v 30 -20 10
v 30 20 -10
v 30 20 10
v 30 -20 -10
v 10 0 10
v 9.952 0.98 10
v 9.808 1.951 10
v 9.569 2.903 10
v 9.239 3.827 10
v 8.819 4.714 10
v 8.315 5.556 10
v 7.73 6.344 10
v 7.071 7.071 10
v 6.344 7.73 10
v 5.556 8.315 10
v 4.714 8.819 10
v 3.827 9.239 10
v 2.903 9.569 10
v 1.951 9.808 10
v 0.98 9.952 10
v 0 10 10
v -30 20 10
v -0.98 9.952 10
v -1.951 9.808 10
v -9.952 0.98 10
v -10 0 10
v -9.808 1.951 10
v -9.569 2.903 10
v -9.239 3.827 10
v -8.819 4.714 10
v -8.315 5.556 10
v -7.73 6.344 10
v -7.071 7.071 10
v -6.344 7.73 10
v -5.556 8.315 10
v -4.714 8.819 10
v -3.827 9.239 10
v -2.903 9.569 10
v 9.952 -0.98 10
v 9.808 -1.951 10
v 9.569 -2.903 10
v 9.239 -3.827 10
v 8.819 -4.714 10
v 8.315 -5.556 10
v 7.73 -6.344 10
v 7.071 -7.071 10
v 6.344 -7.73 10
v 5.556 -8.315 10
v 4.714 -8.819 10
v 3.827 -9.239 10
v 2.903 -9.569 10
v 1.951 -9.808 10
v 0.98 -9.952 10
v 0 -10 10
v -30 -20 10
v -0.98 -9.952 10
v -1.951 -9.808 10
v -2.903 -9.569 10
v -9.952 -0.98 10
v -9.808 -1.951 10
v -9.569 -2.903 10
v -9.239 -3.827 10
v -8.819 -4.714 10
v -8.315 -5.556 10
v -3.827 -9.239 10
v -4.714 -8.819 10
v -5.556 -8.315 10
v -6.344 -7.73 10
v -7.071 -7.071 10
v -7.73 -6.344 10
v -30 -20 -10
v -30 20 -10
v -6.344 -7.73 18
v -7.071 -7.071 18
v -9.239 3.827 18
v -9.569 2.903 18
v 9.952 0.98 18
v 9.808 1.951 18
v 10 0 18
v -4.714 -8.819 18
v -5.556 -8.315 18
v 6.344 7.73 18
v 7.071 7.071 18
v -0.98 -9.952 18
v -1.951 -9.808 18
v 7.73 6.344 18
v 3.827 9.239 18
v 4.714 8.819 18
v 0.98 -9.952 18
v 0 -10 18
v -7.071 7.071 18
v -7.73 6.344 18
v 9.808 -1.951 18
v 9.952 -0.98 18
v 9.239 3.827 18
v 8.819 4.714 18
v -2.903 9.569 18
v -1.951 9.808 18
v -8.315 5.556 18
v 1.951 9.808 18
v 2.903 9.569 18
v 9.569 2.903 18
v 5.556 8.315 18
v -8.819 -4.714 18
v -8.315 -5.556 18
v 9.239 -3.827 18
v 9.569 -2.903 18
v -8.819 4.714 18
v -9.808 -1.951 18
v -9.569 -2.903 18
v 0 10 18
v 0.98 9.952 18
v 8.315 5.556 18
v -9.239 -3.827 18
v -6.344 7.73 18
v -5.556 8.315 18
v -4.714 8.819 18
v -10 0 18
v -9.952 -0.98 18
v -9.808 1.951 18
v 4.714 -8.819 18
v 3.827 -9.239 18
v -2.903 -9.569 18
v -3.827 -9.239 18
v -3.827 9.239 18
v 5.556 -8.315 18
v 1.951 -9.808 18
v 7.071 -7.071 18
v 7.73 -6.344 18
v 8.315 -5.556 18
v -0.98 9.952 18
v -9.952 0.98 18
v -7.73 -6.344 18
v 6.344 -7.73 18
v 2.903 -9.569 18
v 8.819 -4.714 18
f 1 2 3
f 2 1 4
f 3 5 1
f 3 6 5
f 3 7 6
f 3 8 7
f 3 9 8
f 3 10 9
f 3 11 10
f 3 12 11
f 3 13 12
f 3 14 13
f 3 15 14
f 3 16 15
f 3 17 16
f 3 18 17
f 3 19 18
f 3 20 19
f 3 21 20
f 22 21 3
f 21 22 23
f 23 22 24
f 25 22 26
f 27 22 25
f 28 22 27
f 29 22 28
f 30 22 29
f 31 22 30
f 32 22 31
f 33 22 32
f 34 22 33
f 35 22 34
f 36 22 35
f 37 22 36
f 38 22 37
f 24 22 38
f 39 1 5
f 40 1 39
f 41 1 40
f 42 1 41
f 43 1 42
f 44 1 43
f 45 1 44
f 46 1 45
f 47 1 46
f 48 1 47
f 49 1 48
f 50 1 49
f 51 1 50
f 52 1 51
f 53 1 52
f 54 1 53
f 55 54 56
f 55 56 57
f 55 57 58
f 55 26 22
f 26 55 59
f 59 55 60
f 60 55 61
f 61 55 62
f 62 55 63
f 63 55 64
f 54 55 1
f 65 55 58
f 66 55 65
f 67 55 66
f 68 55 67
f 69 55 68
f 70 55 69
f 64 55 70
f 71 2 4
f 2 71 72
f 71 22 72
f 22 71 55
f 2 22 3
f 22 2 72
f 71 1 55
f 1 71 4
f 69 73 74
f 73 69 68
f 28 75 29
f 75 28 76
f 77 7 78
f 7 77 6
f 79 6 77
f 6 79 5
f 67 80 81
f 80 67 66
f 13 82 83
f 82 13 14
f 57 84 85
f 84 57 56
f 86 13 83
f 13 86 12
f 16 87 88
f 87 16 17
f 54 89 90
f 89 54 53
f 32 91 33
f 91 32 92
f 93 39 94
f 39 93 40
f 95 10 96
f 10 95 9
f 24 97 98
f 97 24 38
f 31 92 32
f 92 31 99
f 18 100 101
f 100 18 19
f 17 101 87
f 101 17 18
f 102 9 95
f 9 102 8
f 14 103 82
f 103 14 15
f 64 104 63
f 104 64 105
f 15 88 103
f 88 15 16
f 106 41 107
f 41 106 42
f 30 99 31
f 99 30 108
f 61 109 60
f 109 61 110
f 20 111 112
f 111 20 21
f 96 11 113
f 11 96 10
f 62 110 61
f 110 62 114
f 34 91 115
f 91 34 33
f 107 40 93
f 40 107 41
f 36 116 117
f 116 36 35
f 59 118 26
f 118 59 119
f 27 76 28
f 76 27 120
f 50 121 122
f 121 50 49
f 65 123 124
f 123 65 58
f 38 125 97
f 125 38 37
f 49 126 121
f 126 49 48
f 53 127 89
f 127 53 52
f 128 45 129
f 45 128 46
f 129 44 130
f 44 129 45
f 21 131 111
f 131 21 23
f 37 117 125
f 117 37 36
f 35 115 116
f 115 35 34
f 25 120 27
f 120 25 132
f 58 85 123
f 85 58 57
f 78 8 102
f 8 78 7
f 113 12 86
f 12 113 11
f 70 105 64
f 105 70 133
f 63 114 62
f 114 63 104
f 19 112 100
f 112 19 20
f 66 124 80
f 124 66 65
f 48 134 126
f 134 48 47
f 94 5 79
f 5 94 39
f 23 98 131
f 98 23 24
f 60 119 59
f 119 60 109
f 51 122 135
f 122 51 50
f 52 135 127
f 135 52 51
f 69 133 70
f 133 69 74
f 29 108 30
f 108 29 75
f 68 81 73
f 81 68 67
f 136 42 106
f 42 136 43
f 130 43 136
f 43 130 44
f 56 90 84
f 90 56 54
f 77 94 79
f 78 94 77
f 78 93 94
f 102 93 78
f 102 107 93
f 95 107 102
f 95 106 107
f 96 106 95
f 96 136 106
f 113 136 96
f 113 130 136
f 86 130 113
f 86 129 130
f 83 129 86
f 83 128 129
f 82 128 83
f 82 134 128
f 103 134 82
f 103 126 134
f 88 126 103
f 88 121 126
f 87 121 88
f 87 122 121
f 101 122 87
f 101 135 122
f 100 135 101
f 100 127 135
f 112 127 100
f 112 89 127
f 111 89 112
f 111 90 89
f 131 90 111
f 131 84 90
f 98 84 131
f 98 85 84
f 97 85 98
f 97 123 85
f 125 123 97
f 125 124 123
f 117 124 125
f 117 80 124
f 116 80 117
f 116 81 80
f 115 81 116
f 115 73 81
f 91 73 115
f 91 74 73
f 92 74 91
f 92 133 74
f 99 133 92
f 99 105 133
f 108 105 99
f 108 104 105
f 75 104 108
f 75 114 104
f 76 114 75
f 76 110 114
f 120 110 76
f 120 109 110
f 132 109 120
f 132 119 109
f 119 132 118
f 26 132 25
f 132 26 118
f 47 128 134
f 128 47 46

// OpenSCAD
$fn=64;

block_x = 60;
block_y = 40;
block_z = 20;

boss_d = 20;
boss_h = 8;

module block() {
    cube([block_x, block_y, block_z], center=true);
}

module boss() {
    cylinder(d=boss_d, h=boss_h, center=false);
}

union() {
    block();
    translate([0, 0, block_z/2])
        boss();
}
